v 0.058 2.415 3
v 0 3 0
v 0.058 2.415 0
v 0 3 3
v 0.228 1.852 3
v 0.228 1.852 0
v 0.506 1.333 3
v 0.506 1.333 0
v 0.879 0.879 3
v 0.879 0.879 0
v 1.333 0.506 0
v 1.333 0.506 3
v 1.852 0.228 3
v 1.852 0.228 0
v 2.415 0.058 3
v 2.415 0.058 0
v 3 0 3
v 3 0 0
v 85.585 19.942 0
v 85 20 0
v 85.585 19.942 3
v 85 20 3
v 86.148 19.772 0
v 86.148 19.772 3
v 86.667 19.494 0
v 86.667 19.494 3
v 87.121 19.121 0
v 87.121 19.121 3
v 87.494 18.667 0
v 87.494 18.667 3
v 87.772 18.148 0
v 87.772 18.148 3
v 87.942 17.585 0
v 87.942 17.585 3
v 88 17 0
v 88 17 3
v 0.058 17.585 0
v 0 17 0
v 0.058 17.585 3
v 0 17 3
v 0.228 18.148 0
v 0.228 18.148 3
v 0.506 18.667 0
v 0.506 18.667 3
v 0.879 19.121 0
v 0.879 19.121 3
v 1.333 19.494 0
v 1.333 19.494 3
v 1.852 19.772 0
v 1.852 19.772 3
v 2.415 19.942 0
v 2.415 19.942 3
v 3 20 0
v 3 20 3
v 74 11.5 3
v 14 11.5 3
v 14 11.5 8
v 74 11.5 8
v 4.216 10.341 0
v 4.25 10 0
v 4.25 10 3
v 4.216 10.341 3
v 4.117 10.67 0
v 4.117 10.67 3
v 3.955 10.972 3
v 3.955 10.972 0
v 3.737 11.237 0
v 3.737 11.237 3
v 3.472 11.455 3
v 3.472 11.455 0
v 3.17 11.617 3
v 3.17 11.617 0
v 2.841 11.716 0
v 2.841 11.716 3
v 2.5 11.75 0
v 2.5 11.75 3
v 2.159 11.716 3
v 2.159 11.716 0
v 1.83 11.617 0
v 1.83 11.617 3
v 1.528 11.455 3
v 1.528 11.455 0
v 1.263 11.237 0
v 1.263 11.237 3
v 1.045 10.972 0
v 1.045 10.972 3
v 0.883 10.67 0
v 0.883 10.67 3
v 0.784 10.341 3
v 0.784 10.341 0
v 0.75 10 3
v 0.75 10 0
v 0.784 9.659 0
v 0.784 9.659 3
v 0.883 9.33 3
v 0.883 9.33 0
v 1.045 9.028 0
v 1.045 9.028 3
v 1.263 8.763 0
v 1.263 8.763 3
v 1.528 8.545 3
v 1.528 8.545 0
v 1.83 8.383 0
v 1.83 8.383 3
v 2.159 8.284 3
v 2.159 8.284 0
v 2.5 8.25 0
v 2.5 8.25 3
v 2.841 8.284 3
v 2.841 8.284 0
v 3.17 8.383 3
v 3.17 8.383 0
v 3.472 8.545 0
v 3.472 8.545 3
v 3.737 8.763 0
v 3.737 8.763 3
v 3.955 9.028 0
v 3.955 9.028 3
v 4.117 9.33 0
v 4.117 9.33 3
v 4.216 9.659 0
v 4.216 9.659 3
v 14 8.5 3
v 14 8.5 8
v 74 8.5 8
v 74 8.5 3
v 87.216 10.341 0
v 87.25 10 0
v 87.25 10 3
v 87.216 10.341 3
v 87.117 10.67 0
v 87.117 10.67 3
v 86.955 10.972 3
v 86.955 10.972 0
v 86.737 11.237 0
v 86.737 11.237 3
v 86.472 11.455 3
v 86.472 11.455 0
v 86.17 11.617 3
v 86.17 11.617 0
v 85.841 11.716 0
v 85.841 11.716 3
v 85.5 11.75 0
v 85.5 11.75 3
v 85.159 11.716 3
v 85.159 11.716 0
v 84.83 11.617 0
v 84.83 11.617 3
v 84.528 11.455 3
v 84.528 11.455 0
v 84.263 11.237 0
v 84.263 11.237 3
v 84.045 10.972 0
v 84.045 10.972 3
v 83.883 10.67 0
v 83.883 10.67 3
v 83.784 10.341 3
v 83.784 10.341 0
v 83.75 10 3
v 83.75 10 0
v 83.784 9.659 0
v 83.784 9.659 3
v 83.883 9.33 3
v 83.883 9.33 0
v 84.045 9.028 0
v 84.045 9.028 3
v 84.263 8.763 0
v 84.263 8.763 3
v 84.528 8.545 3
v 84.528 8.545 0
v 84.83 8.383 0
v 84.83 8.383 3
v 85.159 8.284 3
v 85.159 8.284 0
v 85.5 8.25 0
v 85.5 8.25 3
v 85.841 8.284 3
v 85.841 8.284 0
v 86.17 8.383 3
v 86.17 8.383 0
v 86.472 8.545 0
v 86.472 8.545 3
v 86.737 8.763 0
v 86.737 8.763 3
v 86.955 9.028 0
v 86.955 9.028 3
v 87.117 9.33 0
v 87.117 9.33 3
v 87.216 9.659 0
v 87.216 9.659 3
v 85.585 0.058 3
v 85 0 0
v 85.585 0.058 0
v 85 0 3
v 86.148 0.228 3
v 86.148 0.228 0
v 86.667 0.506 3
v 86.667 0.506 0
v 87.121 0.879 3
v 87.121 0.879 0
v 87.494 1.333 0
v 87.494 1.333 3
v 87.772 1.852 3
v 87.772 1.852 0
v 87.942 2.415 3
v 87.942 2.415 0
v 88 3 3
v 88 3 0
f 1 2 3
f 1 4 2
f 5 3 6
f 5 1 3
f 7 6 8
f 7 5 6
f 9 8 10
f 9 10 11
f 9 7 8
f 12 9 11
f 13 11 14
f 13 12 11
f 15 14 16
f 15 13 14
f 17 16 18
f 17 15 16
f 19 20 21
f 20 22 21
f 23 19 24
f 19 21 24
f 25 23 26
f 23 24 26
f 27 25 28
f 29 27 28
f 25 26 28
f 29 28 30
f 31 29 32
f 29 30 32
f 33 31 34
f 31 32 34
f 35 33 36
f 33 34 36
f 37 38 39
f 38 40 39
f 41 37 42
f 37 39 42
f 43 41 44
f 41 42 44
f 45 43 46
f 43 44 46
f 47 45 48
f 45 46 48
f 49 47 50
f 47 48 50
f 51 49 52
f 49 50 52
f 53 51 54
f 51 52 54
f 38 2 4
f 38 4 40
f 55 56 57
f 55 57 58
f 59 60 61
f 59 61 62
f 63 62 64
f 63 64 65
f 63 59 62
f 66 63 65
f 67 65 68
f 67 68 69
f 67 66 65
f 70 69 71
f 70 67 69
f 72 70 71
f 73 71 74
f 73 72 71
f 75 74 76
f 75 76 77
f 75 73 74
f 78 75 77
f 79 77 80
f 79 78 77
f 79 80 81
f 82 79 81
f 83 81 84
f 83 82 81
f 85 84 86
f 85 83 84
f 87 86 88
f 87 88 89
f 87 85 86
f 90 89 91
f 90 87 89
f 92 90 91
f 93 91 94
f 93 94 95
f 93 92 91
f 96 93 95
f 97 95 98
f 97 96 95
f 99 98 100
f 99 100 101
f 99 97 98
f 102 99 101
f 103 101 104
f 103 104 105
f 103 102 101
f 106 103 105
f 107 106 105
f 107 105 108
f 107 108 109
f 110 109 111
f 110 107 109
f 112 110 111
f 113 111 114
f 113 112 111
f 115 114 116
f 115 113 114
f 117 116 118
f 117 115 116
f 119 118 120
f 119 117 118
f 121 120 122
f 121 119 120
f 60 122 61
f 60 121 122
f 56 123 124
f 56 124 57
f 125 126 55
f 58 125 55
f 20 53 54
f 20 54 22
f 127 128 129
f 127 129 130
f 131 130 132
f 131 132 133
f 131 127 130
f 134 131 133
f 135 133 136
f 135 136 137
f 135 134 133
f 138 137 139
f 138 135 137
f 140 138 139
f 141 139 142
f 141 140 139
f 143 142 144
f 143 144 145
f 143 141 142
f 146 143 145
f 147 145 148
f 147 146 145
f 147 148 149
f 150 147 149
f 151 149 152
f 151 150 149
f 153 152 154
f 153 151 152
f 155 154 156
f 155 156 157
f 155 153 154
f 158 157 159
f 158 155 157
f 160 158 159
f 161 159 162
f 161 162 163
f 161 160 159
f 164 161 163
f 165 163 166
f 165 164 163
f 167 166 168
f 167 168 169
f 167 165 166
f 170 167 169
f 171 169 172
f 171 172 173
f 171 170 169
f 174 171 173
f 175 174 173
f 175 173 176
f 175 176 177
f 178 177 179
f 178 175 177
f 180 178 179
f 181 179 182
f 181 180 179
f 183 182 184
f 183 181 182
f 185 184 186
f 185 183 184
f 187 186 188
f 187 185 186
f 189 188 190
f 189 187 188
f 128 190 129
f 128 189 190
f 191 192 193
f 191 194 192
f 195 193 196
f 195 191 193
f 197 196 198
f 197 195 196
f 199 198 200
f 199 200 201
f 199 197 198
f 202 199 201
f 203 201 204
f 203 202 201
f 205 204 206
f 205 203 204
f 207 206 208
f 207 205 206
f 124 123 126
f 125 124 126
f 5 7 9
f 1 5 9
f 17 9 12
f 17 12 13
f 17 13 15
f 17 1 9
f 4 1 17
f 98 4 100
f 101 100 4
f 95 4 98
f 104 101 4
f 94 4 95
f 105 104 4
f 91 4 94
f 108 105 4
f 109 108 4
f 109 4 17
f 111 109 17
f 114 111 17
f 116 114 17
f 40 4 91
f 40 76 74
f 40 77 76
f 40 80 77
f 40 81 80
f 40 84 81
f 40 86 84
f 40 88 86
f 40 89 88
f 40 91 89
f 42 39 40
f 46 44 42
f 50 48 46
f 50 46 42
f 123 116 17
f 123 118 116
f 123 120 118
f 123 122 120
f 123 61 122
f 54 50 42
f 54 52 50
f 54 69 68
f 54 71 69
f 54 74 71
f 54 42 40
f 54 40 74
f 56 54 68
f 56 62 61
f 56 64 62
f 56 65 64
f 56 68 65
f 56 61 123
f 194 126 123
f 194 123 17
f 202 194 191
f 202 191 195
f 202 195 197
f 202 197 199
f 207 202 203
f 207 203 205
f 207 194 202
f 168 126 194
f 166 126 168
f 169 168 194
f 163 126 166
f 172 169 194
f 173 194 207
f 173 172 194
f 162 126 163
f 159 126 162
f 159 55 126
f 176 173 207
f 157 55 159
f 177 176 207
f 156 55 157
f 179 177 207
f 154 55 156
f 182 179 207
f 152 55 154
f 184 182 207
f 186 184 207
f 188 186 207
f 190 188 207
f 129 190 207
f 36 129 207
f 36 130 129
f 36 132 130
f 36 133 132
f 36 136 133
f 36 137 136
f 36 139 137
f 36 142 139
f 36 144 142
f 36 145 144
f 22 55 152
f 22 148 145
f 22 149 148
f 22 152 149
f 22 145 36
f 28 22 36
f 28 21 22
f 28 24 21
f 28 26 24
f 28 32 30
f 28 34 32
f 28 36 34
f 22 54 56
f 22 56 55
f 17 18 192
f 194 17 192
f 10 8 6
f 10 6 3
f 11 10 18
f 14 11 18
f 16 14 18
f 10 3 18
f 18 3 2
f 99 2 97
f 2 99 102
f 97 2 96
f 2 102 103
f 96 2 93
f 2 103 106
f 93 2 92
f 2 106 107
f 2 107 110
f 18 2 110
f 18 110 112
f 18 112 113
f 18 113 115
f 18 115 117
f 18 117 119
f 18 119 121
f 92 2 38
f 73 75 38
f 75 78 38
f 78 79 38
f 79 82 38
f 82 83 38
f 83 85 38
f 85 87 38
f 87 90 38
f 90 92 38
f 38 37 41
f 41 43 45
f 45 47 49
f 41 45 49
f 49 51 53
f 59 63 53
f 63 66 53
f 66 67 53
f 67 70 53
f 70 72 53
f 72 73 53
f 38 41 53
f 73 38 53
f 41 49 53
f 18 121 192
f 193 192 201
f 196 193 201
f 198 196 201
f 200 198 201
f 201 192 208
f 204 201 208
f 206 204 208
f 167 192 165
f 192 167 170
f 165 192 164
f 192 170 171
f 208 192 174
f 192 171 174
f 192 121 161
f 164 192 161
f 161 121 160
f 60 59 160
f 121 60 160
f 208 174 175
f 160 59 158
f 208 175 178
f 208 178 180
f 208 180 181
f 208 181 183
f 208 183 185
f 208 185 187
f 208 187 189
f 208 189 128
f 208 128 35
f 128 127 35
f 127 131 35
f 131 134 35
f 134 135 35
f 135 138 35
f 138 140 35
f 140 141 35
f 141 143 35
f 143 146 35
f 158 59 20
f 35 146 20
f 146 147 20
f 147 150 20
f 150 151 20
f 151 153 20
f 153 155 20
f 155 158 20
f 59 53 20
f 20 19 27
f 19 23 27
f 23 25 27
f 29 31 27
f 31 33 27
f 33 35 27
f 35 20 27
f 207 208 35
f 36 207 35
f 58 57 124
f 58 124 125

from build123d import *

# Parameters (mm, degrees)
ESQUISSE1_W        = 88
ESQUISSE1_H        = 20
ESQUISSE1_R        = 1.75
BOSS_EXTRU_1_DEPTH = 3
ESQUISSE2_W        = 60
ESQUISSE2_H        = 3
BOSS_EXTRU_2_DEPTH = 5
CONG_1_R           = 3


with BuildPart() as part:
    # Esquisse1 → Boss.-Extru.1 (new body)
    with BuildSketch(Plane.XY):
        with Locations((44, 10)):
            Rectangle(ESQUISSE1_W, ESQUISSE1_H)
        with Locations((2.5, 10)):
            Circle(ESQUISSE1_R, mode=Mode.SUBTRACT)
        with Locations((85.5, 10)):
            Circle(ESQUISSE1_R, mode=Mode.SUBTRACT)
    extrude(amount=BOSS_EXTRU_1_DEPTH)

    # Esquisse2 → Boss.-Extru.2 (add)
    with BuildSketch(Plane.XY.offset(3)):
        with Locations((44, 10)):
            Rectangle(ESQUISSE2_W, ESQUISSE2_H)
    extrude(amount=BOSS_EXTRU_2_DEPTH)

    # Congé1
    cong_1_edges = [part.edges().sort_by_distance(p)[0] for p in [
        (0, 20, 1.5),
        (88, 20, 1.5),
        (88, 0, 1.5),
        (0, 0, 1.5),
    ]]
    fillet(cong_1_edges, radius=CONG_1_R)


solid = part.part
